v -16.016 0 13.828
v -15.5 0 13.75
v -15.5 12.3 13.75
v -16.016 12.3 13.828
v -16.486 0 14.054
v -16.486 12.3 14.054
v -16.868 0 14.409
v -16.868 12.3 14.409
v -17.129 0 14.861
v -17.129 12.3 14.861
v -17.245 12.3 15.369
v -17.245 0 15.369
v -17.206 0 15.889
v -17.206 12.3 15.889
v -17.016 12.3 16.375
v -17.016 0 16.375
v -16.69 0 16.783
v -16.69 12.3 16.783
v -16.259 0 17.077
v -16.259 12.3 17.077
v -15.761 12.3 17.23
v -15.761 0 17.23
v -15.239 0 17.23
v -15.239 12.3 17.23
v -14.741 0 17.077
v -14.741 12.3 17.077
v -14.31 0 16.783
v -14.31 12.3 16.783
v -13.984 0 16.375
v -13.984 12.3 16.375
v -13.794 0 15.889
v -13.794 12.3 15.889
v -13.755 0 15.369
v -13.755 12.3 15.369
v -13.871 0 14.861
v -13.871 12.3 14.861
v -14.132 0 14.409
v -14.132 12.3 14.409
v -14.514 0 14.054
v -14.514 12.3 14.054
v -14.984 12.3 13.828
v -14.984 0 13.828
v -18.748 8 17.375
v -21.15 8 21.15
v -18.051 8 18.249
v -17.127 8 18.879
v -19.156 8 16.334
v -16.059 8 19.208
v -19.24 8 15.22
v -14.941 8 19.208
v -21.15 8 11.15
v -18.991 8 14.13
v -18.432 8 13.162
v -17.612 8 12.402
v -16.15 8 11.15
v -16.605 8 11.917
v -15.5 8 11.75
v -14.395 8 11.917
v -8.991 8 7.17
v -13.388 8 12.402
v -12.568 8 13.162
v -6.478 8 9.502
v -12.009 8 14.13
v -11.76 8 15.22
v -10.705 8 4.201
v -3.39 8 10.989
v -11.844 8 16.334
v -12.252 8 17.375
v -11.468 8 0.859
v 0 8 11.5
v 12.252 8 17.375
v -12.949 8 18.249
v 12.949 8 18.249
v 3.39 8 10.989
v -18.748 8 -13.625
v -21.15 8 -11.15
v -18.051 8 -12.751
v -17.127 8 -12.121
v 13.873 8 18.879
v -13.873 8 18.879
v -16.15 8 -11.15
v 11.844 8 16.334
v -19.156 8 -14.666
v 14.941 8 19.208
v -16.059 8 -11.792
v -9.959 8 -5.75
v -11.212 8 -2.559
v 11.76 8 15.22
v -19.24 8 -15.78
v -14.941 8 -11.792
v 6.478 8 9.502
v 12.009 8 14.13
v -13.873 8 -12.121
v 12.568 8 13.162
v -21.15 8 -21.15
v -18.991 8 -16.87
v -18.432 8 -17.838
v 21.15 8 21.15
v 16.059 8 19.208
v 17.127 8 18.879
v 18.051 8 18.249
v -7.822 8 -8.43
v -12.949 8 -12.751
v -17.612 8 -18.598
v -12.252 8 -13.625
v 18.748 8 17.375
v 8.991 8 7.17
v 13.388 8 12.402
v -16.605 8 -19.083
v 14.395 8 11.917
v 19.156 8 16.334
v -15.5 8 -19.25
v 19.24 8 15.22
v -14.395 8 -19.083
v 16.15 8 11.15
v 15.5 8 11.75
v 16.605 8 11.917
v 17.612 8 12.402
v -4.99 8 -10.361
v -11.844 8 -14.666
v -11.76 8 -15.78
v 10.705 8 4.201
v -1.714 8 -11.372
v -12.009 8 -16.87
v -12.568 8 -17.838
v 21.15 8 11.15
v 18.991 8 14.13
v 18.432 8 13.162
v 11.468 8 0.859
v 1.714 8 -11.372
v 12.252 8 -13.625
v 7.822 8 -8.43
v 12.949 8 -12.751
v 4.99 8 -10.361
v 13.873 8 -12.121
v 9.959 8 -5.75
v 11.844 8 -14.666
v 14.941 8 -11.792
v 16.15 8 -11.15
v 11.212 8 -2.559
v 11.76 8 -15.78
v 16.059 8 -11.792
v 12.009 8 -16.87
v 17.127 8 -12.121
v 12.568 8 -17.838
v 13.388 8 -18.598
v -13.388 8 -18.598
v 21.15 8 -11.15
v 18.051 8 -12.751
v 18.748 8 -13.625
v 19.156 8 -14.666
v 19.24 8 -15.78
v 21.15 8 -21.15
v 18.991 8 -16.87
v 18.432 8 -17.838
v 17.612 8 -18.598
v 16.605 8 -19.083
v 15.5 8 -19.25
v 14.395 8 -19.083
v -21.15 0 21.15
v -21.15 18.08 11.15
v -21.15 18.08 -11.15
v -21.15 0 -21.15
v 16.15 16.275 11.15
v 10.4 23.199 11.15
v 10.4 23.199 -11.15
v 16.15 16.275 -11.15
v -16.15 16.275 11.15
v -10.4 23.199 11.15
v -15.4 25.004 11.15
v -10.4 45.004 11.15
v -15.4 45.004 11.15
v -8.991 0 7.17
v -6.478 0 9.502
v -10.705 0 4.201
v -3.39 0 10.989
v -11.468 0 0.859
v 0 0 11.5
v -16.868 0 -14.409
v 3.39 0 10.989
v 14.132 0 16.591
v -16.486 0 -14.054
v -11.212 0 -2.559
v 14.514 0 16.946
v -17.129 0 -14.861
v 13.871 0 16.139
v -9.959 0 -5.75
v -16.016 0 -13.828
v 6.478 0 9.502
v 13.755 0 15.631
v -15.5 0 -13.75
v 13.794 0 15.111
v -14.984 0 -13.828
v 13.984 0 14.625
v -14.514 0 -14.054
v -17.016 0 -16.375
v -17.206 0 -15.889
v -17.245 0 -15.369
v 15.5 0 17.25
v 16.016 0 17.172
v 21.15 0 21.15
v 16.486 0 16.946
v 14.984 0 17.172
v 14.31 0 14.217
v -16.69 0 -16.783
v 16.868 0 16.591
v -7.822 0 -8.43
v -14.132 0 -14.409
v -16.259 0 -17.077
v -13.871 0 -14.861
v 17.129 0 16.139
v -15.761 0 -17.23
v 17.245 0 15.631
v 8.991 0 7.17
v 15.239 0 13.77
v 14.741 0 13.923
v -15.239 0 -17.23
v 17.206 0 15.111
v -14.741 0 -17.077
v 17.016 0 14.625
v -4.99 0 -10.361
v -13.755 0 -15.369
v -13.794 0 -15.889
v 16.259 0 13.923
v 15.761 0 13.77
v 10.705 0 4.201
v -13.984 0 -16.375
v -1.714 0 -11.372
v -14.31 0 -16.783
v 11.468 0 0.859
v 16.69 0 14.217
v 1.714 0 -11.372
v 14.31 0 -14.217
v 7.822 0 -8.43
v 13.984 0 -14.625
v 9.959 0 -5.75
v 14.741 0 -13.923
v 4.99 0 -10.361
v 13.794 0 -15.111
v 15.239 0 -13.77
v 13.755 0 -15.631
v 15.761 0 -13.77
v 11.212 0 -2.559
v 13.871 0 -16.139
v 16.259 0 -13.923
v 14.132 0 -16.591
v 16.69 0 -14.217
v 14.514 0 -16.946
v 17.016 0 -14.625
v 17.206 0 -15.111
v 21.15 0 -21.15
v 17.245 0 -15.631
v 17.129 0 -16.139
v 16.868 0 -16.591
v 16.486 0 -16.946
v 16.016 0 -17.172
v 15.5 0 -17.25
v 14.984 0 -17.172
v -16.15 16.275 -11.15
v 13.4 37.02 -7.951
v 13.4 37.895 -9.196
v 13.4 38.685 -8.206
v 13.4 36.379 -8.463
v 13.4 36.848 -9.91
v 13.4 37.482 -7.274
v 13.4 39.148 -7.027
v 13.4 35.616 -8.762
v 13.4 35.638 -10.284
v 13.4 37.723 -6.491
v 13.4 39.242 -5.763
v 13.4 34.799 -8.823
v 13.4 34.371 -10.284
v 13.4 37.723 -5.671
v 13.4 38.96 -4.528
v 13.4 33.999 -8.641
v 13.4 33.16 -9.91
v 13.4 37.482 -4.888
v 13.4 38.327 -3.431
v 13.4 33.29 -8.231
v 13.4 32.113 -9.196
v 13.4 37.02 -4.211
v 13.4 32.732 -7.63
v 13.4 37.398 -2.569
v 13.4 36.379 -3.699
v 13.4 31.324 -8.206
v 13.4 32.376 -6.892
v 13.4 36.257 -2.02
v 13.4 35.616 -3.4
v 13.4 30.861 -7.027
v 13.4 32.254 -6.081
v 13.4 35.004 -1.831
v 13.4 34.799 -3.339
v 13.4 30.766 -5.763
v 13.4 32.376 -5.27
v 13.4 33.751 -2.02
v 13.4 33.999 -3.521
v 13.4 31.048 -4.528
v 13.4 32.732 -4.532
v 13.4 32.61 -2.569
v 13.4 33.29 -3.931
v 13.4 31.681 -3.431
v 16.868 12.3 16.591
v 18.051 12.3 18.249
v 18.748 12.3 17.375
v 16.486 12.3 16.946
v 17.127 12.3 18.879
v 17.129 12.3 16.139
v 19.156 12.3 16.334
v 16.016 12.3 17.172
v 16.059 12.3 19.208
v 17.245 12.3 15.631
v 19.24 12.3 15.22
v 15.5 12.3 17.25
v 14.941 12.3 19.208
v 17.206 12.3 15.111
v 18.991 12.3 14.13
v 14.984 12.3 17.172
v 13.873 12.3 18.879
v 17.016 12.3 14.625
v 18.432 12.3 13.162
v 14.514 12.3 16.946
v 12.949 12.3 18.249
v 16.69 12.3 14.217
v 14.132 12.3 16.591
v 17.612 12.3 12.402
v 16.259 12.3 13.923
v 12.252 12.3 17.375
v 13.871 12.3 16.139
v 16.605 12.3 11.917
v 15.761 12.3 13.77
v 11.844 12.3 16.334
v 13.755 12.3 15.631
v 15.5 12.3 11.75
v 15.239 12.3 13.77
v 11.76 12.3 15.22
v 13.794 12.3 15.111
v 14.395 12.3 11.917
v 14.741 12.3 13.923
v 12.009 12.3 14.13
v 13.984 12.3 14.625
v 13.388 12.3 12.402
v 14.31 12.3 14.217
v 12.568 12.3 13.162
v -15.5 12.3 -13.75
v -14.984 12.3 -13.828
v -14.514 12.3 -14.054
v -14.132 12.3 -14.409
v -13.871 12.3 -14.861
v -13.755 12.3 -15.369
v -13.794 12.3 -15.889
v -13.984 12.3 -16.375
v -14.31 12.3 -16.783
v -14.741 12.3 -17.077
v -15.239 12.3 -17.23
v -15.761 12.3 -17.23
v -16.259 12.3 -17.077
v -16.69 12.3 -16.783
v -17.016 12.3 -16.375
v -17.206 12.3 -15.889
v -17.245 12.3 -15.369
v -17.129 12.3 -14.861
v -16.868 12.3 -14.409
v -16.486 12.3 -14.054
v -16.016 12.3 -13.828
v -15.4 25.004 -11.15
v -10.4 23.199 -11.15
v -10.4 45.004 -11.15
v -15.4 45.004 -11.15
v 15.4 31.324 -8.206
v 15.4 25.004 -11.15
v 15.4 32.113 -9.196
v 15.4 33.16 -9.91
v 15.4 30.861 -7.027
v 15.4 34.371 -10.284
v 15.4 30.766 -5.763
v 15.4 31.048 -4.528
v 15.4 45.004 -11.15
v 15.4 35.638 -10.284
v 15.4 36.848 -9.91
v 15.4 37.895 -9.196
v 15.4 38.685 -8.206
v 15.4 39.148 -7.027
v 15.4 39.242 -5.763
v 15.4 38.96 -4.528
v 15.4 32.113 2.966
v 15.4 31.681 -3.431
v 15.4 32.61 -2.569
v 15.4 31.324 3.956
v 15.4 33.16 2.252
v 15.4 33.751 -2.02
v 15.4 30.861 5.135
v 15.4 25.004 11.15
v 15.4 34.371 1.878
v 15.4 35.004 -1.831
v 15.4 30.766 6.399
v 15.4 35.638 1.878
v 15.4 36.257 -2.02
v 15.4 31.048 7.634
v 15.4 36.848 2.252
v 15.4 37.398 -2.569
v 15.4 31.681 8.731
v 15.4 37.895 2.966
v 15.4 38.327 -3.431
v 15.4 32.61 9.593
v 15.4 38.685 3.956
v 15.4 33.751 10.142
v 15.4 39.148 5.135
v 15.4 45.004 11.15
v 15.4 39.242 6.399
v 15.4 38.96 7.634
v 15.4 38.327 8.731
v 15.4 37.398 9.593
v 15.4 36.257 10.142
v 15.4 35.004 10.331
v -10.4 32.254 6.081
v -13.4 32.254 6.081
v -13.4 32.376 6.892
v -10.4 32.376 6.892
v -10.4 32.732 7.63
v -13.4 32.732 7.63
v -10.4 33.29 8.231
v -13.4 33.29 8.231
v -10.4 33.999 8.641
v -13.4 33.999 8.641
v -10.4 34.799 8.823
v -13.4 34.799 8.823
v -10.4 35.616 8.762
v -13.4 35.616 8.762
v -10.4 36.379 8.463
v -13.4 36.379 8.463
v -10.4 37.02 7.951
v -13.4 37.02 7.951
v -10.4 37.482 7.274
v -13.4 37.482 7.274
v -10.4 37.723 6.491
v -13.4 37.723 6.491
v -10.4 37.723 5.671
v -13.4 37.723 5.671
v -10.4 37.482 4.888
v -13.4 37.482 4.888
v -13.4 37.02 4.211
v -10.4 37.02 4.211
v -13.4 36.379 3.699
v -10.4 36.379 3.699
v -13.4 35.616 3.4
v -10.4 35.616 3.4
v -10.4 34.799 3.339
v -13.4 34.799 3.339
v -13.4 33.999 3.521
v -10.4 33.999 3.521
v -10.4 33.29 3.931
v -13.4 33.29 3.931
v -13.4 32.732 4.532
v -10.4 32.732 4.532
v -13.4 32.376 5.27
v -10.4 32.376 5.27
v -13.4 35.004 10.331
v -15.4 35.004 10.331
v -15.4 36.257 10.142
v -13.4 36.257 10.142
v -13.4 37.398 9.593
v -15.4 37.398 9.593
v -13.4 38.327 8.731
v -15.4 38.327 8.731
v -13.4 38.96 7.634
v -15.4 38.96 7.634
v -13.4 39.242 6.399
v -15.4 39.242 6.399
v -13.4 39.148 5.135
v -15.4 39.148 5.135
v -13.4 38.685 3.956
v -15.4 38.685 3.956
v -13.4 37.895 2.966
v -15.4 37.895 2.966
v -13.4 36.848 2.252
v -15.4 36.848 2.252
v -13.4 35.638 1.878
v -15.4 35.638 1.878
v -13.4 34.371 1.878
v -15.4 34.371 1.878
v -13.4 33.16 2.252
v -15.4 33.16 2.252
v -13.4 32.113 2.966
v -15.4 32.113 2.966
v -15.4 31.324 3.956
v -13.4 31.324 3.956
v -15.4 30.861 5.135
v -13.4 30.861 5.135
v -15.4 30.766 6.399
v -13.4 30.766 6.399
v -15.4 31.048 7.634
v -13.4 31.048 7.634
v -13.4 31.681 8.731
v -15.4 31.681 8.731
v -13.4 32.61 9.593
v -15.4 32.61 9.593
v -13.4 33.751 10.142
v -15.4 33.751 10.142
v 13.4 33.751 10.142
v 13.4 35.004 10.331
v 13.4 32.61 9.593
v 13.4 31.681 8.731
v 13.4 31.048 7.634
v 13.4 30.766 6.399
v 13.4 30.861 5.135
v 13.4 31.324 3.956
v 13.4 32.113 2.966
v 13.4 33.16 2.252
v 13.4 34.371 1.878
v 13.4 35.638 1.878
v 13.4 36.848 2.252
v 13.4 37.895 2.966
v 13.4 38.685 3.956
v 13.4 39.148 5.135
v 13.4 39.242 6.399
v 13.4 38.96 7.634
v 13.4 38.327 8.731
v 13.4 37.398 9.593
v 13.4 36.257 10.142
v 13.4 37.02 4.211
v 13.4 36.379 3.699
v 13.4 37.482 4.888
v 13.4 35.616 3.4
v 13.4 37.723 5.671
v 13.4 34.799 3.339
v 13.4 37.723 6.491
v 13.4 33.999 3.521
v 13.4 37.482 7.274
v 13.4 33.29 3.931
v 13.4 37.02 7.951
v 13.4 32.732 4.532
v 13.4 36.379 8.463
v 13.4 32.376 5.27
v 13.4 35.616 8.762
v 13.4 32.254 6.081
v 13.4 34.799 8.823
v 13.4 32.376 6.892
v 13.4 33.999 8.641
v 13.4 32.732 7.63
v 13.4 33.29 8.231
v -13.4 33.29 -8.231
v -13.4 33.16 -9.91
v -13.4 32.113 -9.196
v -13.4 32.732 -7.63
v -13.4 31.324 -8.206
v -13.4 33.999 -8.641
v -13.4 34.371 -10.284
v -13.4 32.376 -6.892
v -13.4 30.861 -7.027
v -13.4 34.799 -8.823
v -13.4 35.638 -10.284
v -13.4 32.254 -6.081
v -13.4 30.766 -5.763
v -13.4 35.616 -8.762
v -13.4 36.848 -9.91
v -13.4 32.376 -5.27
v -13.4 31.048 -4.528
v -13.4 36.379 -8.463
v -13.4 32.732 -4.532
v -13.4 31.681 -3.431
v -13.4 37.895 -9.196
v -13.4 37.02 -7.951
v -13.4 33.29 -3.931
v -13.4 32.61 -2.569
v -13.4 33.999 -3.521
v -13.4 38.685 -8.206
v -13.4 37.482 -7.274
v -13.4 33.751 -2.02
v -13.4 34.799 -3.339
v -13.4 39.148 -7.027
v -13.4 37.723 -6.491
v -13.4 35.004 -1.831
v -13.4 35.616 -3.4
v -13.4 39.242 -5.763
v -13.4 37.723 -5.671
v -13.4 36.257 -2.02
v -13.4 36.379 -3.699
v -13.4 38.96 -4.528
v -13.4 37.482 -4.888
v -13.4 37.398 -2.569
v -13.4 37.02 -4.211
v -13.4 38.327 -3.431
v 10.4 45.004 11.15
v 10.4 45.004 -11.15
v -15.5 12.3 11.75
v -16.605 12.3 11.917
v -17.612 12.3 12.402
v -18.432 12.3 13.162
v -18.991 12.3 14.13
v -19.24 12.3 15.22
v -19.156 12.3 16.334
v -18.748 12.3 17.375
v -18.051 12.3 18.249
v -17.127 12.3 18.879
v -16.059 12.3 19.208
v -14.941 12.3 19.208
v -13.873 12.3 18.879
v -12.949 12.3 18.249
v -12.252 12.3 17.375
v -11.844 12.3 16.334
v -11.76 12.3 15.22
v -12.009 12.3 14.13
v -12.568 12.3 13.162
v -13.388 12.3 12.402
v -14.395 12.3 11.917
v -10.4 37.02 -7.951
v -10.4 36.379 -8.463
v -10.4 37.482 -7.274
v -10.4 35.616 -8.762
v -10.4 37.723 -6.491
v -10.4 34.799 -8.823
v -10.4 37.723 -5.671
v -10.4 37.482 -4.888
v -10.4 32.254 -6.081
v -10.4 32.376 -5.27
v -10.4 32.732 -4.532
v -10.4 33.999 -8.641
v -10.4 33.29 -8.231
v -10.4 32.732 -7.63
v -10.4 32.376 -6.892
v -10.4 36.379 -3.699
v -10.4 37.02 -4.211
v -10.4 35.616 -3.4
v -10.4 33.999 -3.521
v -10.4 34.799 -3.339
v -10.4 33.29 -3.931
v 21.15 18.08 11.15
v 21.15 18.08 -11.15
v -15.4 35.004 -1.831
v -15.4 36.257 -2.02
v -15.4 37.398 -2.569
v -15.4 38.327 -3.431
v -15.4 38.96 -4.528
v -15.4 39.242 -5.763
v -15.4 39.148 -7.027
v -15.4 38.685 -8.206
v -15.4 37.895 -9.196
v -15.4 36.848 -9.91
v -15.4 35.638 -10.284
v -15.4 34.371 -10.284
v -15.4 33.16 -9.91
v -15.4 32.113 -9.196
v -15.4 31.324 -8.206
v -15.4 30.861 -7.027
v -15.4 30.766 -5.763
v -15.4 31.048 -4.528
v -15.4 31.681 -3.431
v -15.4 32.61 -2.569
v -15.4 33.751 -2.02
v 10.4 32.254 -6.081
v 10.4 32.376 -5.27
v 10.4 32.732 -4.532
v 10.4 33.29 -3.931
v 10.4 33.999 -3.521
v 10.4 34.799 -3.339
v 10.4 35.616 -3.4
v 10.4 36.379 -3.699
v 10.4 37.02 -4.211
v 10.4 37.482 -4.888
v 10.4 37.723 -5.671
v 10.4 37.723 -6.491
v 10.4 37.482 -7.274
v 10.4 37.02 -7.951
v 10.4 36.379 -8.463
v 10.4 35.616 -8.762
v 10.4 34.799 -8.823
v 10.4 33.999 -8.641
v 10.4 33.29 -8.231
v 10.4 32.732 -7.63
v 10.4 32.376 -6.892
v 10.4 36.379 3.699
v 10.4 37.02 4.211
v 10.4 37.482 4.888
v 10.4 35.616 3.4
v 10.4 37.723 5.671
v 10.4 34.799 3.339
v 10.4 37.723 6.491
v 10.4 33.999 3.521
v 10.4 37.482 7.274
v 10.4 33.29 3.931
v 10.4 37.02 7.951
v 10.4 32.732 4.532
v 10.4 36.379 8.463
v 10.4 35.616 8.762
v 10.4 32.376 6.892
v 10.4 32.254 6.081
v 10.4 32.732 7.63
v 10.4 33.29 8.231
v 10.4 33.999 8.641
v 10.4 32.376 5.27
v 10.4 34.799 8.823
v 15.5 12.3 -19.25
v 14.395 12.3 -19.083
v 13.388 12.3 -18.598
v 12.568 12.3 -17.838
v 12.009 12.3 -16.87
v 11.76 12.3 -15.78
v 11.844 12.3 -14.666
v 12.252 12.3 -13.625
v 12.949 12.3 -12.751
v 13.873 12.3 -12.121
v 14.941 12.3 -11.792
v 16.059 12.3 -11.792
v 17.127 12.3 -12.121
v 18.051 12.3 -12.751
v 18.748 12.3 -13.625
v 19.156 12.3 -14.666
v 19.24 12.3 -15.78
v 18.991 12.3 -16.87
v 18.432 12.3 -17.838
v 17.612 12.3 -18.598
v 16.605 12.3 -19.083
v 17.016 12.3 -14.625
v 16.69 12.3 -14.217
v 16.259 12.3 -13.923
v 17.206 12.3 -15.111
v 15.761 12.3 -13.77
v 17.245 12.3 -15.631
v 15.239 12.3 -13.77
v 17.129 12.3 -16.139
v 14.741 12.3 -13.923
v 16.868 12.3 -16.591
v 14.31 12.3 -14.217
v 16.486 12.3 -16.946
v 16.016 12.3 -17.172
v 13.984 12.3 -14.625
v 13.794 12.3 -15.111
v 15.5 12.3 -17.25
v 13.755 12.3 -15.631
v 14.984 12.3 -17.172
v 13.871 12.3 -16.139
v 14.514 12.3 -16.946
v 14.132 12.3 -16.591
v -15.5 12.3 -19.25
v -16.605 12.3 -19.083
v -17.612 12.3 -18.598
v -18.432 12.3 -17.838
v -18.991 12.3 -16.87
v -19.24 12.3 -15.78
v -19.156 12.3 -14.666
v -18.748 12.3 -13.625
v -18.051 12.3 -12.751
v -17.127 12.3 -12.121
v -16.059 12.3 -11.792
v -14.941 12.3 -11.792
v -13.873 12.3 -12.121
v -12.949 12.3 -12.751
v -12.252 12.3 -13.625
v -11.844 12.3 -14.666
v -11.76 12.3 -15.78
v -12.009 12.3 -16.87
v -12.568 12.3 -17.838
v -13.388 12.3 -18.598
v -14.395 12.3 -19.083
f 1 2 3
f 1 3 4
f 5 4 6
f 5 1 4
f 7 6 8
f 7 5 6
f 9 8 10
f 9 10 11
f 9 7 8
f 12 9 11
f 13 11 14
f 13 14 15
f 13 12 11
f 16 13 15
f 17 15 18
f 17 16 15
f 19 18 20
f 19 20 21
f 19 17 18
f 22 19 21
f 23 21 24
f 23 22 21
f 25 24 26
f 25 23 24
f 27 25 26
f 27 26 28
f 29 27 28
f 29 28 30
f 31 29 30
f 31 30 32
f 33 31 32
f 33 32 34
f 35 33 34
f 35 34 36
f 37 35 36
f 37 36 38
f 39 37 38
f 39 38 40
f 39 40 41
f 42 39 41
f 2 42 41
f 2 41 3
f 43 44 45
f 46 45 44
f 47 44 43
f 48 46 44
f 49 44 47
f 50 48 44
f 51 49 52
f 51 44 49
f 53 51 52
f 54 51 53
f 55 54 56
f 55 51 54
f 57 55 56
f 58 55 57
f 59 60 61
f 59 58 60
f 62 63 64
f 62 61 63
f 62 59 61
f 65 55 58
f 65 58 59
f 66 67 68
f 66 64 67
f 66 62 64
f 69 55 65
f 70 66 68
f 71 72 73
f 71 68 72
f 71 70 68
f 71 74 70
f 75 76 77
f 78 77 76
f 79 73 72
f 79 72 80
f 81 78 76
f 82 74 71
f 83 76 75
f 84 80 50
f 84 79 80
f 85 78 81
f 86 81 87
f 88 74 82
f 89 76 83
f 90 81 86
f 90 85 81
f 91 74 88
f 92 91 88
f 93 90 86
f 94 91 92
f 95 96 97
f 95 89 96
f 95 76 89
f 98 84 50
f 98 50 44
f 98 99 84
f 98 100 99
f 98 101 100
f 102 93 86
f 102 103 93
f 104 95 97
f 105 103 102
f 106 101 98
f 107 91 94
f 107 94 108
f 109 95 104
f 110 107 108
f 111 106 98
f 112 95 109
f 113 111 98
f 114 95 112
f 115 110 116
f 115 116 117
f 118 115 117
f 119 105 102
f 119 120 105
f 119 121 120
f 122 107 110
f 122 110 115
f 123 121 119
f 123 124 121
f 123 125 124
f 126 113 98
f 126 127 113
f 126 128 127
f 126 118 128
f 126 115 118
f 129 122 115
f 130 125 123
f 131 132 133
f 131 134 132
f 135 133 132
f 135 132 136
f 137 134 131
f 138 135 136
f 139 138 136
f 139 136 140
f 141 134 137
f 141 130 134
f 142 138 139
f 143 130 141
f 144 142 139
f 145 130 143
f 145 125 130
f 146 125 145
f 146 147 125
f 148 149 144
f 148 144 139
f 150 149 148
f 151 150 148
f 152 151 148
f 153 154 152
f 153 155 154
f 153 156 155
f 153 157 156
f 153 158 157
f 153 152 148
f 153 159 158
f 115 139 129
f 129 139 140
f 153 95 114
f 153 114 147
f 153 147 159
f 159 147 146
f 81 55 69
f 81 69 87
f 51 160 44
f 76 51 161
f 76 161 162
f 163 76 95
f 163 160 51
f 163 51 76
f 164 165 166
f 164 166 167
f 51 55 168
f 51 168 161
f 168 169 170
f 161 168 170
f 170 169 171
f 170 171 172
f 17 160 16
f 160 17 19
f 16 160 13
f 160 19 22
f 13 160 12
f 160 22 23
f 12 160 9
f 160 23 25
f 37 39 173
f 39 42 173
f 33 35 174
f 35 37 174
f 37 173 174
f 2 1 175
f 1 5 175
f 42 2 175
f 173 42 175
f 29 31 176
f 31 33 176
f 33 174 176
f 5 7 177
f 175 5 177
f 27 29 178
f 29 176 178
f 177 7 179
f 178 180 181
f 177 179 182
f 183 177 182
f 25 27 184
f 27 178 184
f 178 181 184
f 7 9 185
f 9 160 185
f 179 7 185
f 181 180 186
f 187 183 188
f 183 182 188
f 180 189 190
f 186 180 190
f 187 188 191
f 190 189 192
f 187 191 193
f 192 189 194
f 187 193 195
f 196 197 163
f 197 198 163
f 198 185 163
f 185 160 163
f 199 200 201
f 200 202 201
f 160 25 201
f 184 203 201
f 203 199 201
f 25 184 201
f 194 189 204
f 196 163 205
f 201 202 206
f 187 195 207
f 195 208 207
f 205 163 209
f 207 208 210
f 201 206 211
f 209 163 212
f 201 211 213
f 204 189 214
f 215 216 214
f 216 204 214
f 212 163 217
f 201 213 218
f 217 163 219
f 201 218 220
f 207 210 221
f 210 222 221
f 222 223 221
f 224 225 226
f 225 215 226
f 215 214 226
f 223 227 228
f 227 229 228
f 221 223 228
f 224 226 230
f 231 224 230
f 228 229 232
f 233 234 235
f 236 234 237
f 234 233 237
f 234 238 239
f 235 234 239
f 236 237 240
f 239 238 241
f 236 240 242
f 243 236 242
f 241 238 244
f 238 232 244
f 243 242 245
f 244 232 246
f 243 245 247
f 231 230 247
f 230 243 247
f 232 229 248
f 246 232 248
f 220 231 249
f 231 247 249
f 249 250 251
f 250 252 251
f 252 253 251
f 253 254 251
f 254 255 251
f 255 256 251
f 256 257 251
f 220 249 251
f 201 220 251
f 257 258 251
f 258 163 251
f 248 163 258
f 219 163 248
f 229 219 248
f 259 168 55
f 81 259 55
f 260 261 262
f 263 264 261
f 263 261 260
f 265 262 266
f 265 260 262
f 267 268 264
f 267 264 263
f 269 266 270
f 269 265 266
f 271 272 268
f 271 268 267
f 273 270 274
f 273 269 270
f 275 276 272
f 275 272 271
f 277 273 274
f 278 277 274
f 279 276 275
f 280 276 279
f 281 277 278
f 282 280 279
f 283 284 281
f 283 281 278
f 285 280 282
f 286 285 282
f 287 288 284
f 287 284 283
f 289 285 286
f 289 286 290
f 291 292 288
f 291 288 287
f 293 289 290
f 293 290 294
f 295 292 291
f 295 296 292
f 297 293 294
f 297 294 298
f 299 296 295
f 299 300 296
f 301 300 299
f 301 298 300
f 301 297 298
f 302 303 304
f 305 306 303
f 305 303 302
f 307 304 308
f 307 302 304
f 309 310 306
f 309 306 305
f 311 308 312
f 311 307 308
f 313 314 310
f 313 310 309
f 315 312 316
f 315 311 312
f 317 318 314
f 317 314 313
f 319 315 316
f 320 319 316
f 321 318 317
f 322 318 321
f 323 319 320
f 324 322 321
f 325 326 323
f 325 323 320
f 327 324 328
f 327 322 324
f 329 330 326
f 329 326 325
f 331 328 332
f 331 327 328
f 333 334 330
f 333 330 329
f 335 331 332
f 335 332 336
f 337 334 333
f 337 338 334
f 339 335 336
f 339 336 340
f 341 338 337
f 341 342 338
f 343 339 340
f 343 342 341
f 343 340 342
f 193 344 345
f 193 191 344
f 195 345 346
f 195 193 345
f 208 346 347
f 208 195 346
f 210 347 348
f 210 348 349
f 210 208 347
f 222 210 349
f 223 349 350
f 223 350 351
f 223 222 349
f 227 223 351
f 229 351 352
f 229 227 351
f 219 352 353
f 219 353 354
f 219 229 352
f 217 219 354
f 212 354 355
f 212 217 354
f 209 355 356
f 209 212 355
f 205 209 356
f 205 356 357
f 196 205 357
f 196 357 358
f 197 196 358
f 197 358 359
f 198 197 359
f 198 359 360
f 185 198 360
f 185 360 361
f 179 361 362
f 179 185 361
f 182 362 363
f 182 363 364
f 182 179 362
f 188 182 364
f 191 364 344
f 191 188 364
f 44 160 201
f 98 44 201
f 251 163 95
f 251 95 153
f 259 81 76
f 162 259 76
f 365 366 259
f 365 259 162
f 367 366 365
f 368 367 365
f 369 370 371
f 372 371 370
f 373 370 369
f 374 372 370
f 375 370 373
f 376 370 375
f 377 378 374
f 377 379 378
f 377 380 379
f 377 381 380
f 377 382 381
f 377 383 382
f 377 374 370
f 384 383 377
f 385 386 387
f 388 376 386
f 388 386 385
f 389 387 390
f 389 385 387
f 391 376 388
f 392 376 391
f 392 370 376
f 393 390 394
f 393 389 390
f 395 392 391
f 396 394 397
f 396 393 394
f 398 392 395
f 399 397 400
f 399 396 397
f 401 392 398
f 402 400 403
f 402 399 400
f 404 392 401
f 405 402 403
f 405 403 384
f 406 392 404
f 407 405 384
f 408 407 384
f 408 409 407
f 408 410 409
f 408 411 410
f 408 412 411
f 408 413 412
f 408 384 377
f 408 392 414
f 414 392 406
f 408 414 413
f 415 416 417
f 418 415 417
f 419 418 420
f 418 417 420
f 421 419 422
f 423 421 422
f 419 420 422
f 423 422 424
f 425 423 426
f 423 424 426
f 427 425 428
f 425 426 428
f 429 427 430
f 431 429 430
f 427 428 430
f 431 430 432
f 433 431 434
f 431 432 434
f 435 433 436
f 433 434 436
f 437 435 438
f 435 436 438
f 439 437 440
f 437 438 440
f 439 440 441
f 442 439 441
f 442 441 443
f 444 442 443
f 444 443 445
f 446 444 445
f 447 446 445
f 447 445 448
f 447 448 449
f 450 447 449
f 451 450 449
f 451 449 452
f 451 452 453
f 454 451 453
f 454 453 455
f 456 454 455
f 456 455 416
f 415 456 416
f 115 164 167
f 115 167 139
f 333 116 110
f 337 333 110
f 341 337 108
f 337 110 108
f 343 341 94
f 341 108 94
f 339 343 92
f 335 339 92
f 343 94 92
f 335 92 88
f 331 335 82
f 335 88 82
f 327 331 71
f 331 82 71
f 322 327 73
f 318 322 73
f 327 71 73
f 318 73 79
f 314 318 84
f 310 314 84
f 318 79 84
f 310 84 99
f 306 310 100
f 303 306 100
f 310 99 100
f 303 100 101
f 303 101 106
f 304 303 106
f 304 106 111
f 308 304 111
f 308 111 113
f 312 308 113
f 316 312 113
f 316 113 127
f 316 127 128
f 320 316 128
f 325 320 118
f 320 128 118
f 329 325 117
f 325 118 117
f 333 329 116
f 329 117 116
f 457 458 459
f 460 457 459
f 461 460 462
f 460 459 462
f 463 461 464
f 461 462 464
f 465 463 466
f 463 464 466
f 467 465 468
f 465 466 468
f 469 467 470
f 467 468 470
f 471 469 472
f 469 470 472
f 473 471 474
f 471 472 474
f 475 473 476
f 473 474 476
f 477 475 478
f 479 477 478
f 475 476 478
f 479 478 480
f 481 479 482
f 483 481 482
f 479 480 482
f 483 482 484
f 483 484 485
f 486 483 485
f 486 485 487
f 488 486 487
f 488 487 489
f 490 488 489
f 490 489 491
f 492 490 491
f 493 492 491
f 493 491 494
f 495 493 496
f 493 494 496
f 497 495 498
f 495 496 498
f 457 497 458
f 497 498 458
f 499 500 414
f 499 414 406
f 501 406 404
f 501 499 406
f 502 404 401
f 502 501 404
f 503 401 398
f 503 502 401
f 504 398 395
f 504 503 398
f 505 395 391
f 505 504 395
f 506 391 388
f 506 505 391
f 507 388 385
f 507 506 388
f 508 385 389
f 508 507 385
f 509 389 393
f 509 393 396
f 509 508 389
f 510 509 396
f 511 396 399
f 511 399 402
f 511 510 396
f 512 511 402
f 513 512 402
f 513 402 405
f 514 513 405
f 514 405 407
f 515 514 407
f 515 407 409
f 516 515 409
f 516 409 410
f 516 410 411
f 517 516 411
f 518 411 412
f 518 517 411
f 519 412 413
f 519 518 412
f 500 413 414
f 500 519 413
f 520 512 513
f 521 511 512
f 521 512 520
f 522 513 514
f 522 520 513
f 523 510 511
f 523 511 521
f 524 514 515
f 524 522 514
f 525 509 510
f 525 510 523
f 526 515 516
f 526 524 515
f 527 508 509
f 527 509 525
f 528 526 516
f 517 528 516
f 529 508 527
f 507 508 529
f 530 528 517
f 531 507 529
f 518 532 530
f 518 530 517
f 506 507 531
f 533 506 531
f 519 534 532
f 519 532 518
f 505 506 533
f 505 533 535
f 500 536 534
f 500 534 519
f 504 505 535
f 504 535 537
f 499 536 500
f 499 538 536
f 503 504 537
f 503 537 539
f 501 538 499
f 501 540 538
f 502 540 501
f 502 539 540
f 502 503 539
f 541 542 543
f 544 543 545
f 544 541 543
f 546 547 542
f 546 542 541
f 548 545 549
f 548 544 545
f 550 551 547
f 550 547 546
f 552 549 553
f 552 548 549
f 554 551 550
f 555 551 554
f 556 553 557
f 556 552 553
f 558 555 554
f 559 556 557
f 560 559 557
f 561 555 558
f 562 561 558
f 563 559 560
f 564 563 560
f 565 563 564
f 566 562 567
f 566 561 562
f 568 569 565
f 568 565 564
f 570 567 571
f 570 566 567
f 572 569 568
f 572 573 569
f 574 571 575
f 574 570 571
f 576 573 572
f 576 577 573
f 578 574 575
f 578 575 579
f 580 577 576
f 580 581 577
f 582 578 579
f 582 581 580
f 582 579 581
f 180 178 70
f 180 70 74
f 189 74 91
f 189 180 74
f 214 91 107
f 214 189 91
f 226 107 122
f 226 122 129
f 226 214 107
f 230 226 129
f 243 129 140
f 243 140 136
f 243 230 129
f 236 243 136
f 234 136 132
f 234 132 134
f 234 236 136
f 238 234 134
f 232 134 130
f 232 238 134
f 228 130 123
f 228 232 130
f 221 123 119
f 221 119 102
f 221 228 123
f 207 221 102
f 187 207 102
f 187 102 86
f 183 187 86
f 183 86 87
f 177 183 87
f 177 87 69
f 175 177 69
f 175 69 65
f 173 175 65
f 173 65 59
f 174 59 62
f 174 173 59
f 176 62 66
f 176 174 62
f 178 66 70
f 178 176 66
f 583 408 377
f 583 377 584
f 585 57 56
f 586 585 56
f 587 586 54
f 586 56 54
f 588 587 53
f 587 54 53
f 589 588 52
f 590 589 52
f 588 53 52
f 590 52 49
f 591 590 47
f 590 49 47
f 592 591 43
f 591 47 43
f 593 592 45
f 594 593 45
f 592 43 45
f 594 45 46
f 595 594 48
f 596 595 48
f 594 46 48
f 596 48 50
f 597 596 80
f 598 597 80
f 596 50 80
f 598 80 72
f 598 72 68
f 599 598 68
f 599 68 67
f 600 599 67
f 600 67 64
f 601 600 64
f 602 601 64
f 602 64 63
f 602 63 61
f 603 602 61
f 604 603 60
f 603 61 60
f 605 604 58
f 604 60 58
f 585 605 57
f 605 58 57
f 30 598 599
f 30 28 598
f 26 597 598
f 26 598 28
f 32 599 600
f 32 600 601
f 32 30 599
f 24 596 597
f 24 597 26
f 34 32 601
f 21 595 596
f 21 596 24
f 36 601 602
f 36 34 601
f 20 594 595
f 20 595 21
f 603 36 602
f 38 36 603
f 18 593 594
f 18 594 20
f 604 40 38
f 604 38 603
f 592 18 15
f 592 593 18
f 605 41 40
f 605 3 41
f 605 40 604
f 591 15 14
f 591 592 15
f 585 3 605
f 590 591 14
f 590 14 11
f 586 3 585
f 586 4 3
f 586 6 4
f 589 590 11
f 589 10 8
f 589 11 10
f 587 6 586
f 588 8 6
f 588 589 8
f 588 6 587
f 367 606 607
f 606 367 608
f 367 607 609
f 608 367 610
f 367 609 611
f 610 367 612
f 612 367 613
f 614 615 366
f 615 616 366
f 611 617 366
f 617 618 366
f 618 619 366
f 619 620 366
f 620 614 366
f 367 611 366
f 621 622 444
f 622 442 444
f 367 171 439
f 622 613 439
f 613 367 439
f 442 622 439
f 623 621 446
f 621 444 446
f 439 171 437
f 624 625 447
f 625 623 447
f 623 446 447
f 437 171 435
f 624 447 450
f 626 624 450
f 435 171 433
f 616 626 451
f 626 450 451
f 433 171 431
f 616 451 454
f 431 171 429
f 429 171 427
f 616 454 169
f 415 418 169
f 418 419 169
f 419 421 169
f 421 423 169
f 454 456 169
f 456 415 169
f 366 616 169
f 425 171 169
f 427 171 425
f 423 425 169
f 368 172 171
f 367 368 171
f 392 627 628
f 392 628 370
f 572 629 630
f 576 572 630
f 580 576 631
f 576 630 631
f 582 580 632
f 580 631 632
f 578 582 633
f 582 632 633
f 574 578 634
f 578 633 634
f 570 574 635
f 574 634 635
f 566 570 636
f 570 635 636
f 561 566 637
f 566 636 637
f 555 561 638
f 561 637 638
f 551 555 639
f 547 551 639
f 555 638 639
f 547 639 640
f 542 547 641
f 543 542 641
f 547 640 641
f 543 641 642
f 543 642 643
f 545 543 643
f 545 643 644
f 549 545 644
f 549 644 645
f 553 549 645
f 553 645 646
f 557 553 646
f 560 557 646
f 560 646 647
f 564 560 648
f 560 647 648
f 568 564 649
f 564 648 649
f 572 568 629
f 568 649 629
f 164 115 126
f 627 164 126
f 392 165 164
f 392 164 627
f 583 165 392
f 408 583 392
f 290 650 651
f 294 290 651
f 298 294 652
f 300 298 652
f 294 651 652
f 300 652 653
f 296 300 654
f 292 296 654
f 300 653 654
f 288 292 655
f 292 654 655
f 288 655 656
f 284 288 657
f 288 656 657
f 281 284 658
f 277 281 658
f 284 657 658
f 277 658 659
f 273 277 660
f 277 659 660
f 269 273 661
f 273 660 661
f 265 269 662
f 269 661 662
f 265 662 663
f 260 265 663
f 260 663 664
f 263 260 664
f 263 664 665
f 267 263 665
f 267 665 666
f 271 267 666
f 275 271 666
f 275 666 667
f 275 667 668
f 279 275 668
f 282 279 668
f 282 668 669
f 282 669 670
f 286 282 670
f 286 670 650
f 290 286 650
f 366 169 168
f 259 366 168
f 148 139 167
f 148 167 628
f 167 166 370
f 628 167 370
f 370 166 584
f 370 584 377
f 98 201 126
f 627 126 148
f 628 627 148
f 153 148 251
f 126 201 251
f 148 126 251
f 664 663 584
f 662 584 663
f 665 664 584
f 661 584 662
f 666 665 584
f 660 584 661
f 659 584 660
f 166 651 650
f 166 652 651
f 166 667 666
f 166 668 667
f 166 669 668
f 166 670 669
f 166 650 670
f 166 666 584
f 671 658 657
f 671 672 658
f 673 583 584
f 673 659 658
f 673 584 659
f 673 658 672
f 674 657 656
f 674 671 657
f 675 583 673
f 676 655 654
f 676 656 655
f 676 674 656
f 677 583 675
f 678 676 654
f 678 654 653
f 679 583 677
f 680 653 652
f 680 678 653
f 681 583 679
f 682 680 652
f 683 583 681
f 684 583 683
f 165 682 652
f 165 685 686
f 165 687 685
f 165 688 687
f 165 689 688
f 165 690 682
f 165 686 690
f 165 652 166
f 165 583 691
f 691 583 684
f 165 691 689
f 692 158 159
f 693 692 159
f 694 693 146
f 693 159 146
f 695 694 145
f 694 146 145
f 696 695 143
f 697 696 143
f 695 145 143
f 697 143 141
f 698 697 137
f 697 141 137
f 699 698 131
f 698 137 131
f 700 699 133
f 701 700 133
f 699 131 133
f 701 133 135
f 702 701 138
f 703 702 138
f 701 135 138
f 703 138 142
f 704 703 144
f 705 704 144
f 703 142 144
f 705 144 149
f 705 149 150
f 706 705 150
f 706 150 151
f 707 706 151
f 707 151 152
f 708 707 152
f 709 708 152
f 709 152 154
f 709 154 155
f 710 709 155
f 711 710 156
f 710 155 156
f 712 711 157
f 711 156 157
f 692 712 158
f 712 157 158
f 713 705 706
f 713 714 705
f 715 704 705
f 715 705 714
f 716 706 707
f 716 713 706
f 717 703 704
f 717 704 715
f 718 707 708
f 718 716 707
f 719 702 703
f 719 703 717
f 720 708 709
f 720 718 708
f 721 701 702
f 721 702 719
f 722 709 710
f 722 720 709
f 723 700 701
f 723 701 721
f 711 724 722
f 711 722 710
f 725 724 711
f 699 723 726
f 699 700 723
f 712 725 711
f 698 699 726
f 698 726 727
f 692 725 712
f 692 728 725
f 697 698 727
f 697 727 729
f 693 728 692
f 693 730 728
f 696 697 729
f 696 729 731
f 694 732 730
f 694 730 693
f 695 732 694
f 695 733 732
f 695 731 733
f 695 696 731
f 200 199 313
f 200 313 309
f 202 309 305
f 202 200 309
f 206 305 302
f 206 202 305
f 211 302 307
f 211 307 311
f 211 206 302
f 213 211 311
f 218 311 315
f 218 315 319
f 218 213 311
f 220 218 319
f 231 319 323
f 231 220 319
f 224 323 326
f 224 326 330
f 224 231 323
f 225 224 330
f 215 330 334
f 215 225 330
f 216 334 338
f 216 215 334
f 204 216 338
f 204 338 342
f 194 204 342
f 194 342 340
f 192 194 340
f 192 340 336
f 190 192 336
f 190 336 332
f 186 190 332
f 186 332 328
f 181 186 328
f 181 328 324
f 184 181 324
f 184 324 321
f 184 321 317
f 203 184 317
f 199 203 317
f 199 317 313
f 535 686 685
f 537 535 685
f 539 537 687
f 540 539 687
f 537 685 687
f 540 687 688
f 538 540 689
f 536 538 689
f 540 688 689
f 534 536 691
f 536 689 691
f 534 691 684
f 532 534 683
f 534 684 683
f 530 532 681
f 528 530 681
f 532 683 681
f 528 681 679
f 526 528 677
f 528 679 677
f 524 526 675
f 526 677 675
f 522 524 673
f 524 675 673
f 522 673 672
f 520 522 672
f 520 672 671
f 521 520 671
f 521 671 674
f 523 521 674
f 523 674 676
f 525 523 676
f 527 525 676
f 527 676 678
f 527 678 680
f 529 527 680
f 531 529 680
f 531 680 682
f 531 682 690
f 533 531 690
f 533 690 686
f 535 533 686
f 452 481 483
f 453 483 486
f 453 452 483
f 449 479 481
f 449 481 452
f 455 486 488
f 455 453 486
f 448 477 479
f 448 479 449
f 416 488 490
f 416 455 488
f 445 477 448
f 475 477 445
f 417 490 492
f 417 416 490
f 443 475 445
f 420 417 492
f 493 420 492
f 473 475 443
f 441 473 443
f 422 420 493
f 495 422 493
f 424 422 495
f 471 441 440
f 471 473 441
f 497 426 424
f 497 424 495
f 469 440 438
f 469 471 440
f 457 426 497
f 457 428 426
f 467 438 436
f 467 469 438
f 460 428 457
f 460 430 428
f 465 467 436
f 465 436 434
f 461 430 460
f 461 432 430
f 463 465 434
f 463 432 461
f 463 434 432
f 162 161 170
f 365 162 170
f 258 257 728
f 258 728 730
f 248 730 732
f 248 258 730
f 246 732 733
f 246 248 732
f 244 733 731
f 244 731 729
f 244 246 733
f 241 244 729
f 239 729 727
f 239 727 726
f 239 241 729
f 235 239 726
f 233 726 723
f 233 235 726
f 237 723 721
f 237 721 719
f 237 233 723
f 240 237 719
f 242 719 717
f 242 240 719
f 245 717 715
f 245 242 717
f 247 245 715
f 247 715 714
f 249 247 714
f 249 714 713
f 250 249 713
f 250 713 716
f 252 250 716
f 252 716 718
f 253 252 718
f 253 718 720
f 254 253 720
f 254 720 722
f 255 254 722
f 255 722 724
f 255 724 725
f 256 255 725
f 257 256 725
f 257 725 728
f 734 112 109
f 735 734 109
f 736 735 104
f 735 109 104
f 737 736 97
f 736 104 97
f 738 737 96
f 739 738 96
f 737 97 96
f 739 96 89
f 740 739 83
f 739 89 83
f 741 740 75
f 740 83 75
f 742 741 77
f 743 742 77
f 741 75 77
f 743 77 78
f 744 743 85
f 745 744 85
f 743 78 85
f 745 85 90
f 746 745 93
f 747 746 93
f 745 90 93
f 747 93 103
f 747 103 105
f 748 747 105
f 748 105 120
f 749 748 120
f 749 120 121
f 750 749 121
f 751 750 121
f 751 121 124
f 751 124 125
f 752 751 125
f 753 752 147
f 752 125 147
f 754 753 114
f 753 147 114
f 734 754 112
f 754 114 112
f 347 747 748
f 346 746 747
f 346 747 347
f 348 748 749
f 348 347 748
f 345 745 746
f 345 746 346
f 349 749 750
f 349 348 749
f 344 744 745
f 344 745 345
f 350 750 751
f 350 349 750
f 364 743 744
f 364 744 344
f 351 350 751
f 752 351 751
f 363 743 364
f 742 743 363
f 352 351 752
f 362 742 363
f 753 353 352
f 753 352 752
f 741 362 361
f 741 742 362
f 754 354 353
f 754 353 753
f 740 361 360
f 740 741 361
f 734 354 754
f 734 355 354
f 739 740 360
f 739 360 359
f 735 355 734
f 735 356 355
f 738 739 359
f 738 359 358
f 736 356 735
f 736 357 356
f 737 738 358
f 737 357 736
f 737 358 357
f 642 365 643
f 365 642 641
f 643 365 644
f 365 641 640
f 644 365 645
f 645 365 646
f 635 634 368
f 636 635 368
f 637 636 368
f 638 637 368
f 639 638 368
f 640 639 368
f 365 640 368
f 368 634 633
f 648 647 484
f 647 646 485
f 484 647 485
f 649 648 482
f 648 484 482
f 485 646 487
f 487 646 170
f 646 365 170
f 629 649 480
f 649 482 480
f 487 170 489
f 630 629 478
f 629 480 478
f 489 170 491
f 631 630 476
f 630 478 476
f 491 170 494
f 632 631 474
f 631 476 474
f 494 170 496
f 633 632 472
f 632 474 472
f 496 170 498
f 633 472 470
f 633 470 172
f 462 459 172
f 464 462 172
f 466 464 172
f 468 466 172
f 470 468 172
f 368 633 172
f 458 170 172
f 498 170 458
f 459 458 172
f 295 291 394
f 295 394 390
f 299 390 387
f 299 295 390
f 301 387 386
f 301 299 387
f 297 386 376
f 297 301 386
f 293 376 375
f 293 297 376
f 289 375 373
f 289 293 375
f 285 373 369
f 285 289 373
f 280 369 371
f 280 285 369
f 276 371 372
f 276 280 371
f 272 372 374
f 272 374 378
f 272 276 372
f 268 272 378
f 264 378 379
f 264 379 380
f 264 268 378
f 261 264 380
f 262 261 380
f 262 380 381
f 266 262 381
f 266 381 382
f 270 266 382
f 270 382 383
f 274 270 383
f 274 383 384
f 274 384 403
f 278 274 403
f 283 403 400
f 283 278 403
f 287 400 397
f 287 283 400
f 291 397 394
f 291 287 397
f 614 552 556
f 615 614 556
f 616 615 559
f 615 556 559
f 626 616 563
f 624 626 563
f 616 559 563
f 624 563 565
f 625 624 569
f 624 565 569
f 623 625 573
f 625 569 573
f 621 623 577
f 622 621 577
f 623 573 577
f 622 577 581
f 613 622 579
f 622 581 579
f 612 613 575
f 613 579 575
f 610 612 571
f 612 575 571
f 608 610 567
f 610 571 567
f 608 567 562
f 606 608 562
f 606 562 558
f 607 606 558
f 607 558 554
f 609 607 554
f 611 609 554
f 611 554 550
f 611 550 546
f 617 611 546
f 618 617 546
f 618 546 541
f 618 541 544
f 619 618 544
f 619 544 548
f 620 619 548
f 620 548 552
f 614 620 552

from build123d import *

# Parameters (mm, degrees)
SKETCH1_W           = 42.3
SKETCH1_H           = 42.3
SKETCH1_R           = 1.75
SKETCH1_R_2         = 11.5
BOSS_EXTRUDE1_DEPTH = 8
BOSS_EXTRUDE2_START = -10
BOSS_EXTRUDE2_DEPTH = 22.3
SKETCH4_R           = 2.75
CUT_EXTRUDE1_DEPTH  = 62.713839627
SKETCH5_R           = 3.75
SKETCH5_R_2         = 1.75
BOSS_EXTRUDE3_DEPTH = 4.3
SKETCH7_R           = 4.25
CUT_EXTRUDE2_DEPTH  = 2
CUT_EXTRUDE3_START  = -2
SKETCH8_R           = 4.25
CUT_EXTRUDE3_DEPTH  = 2


with BuildPart() as part:
    # Sketch1 → Boss-Extrude1 (new body)
    with BuildSketch(Plane(origin=(0, 0, 0), x_dir=(1, 0, 0), z_dir=(0, 1, 0))):
        Rectangle(SKETCH1_W, SKETCH1_H)
        with Locations(Location((-15.5, 15.5, 0), (0, 0, 270))):
            Circle(SKETCH1_R, mode=Mode.SUBTRACT)
        with Locations(Location((15.5, 15.5, 0), (0, 0, 90))):
            Circle(SKETCH1_R, mode=Mode.SUBTRACT)
        with Locations(Location((15.5, -15.5, 0), (0, 0, 270))):
            Circle(SKETCH1_R, mode=Mode.SUBTRACT)
        with Locations(Location((-15.5, -15.5, 0), (0, 0, 90))):
            Circle(SKETCH1_R, mode=Mode.SUBTRACT)
        with Locations(Location((0, 0, 0), (0, 0, 270))):
            Circle(SKETCH1_R_2, mode=Mode.SUBTRACT)
    extrude(amount=BOSS_EXTRUDE1_DEPTH)

    # Sketch3 → Boss-Extrude2 (add)
    with BuildSketch(Plane.XY.offset(21.15).offset(BOSS_EXTRUDE2_START)):
        Polygon((-21.15, 8), (-21.15, 18.080453059), (-15.4, 25.004144271), (-15.4, 45.004144271), (-10.4, 45.004144271), (-10.4, 23.198658368), (-16.15, 16.274967156), (-16.15, 8), align=None)
        Polygon((16.15, 16.274967156), (16.15, 8), (21.15, 8), (21.15, 18.080453059), (15.4, 25.004144271), (15.4, 45.004144271), (10.4, 45.004144271), (10.4, 23.198658368), align=None)
    extrude(amount=-BOSS_EXTRUDE2_DEPTH)

    # Sketch4 → Cut-Extrude1 (cut, through all)
    with BuildSketch(Plane.ZY.offset(15.4)):
        with Locations(Location((-6.081010951, 35.004144271, 0), (0, 0, 270))):
            Circle(SKETCH4_R)
        with Locations(Location((6.081010951, 35.004144271, 0), (0, 0, 270))):
            Circle(SKETCH4_R)
    extrude(amount=-CUT_EXTRUDE1_DEPTH, mode=Mode.SUBTRACT)

    # Sketch5 → Boss-Extrude3 (add)
    # profile 1 of 4: a face of its own
    with BuildSketch(Plane(origin=(0, 8, 0), x_dir=(1, 0, 0), z_dir=(0, 1, 0))):
        with Locations(Location((-15.5, 15.5, 0), (0, 0, 90))):
            Circle(SKETCH5_R)
        with Locations(Location((-15.5, 15.5, 0), (0, 0, 270))):
            Circle(SKETCH5_R_2, mode=Mode.SUBTRACT)
    # profile 2 of 4: a face of its own
    with BuildSketch(Plane(origin=(0, 8, 0), x_dir=(1, 0, 0), z_dir=(0, 1, 0))):
        with Locations(Location((15.5, 15.5, 0), (0, 0, 90))):
            Circle(SKETCH5_R)
        with Locations(Location((15.5, 15.5, 0), (0, 0, 90))):
            Circle(SKETCH5_R_2, mode=Mode.SUBTRACT)
    # profile 3 of 4: a face of its own
    with BuildSketch(Plane(origin=(0, 8, 0), x_dir=(1, 0, 0), z_dir=(0, 1, 0))):
        with Locations(Location((15.5, -15.5, 0), (0, 0, 90))):
            Circle(SKETCH5_R)
        with Locations(Location((15.5, -15.5, 0), (0, 0, 270))):
            Circle(SKETCH5_R_2, mode=Mode.SUBTRACT)
    # profile 4 of 4: a face of its own
    with BuildSketch(Plane(origin=(0, 8, 0), x_dir=(1, 0, 0), z_dir=(0, 1, 0))):
        with Locations(Location((-15.5, -15.5, 0), (0, 0, 90))):
            Circle(SKETCH5_R)
        with Locations(Location((-15.5, -15.5, 0), (0, 0, 90))):
            Circle(SKETCH5_R_2, mode=Mode.SUBTRACT)
    extrude(amount=BOSS_EXTRUDE3_DEPTH)

    # Sketch7 → Cut-Extrude2 (cut)
    with BuildSketch(Plane.ZY.offset(15.4)):
        with Locations((-6.081010951, 35.004144271)):
            Circle(SKETCH7_R)
        with Locations((6.081010951, 35.004144271)):
            Circle(SKETCH7_R)
    extrude(amount=-CUT_EXTRUDE2_DEPTH, mode=Mode.SUBTRACT)

    # Sketch8 → Cut-Extrude3 (cut)
    with BuildSketch(Plane(origin=(15.4, 0, 0), x_dir=(0, 0, -1), z_dir=(1, 0, 0)).offset(CUT_EXTRUDE3_START)):
        with Locations(Location((-6.081010951, 35.004144271, 0), (0, 0, 180))):
            Circle(SKETCH8_R)
        with Locations(Location((6.081010951, 35.004144271, 0), (0, 0, 180))):
            Circle(SKETCH8_R)
    extrude(amount=CUT_EXTRUDE3_DEPTH, mode=Mode.SUBTRACT)


solid = part.part
